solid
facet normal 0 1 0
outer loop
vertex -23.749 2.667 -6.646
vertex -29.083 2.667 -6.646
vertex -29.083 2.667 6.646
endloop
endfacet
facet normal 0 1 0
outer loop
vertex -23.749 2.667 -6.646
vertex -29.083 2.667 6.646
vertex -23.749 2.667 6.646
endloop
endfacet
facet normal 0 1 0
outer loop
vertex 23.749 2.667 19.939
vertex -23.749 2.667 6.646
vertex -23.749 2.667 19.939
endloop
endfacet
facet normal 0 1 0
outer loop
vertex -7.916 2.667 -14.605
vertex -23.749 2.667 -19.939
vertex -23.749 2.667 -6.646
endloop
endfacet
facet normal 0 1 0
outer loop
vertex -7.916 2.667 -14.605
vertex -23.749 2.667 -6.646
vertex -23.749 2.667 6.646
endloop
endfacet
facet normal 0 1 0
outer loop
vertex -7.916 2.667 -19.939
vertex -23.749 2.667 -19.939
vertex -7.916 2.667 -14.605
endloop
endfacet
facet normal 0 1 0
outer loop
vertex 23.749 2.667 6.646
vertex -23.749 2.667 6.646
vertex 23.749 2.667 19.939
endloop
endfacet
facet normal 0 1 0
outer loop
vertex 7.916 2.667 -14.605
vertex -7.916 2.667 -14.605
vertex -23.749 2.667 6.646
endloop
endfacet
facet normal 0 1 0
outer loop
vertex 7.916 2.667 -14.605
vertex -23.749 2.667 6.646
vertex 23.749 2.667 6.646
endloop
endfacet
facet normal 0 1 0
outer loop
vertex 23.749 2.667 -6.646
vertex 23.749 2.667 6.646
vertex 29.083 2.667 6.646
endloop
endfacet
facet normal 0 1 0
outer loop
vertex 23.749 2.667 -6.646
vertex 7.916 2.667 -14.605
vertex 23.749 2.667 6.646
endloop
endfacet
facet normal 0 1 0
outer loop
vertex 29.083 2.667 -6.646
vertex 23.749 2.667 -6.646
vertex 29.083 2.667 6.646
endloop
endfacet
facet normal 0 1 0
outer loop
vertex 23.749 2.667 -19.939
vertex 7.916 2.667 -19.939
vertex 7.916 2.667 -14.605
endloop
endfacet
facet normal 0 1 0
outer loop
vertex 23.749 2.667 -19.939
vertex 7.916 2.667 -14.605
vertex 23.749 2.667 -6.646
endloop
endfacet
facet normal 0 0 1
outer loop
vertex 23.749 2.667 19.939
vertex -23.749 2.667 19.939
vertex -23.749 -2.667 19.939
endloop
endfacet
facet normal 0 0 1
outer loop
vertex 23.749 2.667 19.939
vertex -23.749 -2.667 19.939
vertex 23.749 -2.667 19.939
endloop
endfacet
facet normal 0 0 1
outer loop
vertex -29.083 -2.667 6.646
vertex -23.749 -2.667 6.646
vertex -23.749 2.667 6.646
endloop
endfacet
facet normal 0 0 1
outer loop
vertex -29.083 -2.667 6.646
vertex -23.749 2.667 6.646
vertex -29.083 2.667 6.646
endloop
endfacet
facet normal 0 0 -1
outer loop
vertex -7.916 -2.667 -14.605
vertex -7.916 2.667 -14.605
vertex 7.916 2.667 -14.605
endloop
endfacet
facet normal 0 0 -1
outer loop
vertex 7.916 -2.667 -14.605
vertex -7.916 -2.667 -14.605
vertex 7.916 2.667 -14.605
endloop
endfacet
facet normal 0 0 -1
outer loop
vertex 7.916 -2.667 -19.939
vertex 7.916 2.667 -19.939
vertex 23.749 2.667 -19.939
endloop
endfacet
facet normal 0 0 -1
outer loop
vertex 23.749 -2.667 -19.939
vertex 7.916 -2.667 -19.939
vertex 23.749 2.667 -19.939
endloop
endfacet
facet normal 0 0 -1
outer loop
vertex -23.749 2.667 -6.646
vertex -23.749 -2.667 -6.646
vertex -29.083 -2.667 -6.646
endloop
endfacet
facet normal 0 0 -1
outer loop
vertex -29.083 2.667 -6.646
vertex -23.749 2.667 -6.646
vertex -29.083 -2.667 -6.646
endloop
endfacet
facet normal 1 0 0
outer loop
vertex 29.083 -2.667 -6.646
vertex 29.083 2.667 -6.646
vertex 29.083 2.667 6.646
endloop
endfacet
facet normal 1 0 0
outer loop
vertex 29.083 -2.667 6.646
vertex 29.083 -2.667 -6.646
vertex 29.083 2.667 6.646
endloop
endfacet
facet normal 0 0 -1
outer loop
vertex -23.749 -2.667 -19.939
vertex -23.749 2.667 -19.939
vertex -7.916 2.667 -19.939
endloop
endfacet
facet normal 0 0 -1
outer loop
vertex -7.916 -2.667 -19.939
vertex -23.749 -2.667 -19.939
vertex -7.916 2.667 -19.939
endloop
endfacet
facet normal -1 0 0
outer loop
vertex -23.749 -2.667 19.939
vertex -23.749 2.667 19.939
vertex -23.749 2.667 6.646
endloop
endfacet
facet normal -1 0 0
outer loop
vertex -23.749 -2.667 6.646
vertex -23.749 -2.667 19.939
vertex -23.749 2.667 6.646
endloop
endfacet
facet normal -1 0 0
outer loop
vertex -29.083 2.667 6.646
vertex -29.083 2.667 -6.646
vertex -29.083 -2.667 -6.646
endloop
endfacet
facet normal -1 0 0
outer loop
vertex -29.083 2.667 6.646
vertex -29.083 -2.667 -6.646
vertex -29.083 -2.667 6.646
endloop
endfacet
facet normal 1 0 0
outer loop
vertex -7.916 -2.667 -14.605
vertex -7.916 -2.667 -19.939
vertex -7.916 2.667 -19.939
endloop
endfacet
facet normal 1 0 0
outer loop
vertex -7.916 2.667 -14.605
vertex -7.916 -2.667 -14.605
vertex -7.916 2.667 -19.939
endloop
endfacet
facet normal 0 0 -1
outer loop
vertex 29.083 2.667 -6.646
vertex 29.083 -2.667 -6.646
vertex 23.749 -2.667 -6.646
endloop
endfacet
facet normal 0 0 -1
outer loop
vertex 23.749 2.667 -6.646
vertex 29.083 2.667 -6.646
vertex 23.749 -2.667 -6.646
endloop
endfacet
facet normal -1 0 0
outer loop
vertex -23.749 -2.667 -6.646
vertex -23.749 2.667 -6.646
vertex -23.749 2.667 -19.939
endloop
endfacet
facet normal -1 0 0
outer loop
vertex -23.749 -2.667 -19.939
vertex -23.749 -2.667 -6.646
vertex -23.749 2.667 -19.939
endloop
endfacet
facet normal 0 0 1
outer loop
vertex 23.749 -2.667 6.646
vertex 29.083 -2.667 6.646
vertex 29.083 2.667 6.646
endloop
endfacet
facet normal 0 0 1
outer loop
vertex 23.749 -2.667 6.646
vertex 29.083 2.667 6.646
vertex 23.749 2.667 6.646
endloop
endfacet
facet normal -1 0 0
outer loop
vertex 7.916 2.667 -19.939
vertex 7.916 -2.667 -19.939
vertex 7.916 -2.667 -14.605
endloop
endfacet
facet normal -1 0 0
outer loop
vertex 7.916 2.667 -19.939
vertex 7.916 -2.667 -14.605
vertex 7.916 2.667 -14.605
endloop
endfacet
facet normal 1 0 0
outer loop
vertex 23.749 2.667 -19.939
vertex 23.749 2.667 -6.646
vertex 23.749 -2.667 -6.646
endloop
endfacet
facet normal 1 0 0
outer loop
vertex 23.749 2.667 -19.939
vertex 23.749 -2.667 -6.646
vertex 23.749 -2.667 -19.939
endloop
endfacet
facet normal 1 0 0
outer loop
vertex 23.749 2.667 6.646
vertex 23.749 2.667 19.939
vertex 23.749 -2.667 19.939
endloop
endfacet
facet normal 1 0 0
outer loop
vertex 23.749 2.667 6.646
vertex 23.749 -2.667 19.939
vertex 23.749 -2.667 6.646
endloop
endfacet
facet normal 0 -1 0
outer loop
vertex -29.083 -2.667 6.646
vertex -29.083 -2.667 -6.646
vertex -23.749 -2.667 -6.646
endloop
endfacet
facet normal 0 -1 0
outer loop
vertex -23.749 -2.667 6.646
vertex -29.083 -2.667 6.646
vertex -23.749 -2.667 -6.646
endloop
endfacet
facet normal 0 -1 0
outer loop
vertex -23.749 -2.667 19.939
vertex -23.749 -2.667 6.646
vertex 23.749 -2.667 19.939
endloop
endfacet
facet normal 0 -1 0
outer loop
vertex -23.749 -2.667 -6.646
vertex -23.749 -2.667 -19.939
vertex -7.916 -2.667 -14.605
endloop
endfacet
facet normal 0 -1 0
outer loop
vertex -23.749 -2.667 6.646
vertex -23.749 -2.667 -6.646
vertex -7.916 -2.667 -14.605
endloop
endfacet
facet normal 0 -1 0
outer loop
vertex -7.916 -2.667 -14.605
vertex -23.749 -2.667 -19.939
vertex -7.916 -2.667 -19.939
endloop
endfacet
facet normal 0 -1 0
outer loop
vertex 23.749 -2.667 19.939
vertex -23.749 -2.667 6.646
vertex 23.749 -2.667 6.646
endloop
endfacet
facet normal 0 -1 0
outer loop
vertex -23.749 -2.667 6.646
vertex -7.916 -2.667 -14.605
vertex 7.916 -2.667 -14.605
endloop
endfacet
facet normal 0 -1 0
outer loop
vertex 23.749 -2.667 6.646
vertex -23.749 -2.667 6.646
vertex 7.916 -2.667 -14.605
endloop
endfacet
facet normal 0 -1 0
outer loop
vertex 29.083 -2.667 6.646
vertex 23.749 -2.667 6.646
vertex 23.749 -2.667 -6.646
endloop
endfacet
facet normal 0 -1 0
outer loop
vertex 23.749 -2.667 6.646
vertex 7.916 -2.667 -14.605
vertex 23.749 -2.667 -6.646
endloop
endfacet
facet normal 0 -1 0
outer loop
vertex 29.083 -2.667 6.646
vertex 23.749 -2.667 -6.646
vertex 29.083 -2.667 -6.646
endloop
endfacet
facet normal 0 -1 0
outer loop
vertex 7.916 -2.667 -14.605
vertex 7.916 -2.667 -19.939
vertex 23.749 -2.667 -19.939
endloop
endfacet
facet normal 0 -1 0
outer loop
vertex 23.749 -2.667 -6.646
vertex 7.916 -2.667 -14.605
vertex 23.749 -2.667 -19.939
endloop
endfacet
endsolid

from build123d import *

# Parameters (mm, degrees)
SKETCH21_W          = 47.498
SKETCH21_H          = 39.878
BOSS_EXTRUDE1_DEPTH = 2.667
SKETCH22_W          = 5.334
SKETCH22_H          = 13.292666666
BOSS_EXTRUDE2_DEPTH = 5.334
CAVITY1_START       = -19.939
CAVITY1_OUTLINE_W   = 15.832666666
CAVITY1_OUTLINE_H   = 5.334
CAVITY1_DEPTH       = 5.334


# Read off the part's stored shape, not the designer's step: Cavity1
with BuildPart() as part:
    # Sketch21 → Boss-Extrude1 (new, symmetric)
    with BuildSketch(Plane(origin=(0, 0, 0), x_dir=(1, 0, 0), z_dir=(0, 1, 0))):
        Rectangle(SKETCH21_W, SKETCH21_H)
    extrude(amount=BOSS_EXTRUDE1_DEPTH, both=True)

    # Sketch22 → Boss-Extrude2 (add, through all)
    with BuildSketch(Plane(origin=(0, 2.667, 0), x_dir=(-1, 0, 0), z_dir=(0, 1, 0))):
        with Locations((26.416, 0)):
            Rectangle(SKETCH22_W, SKETCH22_H)
        with Locations((-26.416, 0)):
            Rectangle(SKETCH22_W, SKETCH22_H)
    extrude(amount=-BOSS_EXTRUDE2_DEPTH)

    # Cavity1 outline → Cavity1 (cut)
    with BuildSketch(Plane.XY.offset(CAVITY1_START)):
        Rectangle(CAVITY1_OUTLINE_W, CAVITY1_OUTLINE_H)
    extrude(amount=CAVITY1_DEPTH, mode=Mode.SUBTRACT)


solid = part.part
